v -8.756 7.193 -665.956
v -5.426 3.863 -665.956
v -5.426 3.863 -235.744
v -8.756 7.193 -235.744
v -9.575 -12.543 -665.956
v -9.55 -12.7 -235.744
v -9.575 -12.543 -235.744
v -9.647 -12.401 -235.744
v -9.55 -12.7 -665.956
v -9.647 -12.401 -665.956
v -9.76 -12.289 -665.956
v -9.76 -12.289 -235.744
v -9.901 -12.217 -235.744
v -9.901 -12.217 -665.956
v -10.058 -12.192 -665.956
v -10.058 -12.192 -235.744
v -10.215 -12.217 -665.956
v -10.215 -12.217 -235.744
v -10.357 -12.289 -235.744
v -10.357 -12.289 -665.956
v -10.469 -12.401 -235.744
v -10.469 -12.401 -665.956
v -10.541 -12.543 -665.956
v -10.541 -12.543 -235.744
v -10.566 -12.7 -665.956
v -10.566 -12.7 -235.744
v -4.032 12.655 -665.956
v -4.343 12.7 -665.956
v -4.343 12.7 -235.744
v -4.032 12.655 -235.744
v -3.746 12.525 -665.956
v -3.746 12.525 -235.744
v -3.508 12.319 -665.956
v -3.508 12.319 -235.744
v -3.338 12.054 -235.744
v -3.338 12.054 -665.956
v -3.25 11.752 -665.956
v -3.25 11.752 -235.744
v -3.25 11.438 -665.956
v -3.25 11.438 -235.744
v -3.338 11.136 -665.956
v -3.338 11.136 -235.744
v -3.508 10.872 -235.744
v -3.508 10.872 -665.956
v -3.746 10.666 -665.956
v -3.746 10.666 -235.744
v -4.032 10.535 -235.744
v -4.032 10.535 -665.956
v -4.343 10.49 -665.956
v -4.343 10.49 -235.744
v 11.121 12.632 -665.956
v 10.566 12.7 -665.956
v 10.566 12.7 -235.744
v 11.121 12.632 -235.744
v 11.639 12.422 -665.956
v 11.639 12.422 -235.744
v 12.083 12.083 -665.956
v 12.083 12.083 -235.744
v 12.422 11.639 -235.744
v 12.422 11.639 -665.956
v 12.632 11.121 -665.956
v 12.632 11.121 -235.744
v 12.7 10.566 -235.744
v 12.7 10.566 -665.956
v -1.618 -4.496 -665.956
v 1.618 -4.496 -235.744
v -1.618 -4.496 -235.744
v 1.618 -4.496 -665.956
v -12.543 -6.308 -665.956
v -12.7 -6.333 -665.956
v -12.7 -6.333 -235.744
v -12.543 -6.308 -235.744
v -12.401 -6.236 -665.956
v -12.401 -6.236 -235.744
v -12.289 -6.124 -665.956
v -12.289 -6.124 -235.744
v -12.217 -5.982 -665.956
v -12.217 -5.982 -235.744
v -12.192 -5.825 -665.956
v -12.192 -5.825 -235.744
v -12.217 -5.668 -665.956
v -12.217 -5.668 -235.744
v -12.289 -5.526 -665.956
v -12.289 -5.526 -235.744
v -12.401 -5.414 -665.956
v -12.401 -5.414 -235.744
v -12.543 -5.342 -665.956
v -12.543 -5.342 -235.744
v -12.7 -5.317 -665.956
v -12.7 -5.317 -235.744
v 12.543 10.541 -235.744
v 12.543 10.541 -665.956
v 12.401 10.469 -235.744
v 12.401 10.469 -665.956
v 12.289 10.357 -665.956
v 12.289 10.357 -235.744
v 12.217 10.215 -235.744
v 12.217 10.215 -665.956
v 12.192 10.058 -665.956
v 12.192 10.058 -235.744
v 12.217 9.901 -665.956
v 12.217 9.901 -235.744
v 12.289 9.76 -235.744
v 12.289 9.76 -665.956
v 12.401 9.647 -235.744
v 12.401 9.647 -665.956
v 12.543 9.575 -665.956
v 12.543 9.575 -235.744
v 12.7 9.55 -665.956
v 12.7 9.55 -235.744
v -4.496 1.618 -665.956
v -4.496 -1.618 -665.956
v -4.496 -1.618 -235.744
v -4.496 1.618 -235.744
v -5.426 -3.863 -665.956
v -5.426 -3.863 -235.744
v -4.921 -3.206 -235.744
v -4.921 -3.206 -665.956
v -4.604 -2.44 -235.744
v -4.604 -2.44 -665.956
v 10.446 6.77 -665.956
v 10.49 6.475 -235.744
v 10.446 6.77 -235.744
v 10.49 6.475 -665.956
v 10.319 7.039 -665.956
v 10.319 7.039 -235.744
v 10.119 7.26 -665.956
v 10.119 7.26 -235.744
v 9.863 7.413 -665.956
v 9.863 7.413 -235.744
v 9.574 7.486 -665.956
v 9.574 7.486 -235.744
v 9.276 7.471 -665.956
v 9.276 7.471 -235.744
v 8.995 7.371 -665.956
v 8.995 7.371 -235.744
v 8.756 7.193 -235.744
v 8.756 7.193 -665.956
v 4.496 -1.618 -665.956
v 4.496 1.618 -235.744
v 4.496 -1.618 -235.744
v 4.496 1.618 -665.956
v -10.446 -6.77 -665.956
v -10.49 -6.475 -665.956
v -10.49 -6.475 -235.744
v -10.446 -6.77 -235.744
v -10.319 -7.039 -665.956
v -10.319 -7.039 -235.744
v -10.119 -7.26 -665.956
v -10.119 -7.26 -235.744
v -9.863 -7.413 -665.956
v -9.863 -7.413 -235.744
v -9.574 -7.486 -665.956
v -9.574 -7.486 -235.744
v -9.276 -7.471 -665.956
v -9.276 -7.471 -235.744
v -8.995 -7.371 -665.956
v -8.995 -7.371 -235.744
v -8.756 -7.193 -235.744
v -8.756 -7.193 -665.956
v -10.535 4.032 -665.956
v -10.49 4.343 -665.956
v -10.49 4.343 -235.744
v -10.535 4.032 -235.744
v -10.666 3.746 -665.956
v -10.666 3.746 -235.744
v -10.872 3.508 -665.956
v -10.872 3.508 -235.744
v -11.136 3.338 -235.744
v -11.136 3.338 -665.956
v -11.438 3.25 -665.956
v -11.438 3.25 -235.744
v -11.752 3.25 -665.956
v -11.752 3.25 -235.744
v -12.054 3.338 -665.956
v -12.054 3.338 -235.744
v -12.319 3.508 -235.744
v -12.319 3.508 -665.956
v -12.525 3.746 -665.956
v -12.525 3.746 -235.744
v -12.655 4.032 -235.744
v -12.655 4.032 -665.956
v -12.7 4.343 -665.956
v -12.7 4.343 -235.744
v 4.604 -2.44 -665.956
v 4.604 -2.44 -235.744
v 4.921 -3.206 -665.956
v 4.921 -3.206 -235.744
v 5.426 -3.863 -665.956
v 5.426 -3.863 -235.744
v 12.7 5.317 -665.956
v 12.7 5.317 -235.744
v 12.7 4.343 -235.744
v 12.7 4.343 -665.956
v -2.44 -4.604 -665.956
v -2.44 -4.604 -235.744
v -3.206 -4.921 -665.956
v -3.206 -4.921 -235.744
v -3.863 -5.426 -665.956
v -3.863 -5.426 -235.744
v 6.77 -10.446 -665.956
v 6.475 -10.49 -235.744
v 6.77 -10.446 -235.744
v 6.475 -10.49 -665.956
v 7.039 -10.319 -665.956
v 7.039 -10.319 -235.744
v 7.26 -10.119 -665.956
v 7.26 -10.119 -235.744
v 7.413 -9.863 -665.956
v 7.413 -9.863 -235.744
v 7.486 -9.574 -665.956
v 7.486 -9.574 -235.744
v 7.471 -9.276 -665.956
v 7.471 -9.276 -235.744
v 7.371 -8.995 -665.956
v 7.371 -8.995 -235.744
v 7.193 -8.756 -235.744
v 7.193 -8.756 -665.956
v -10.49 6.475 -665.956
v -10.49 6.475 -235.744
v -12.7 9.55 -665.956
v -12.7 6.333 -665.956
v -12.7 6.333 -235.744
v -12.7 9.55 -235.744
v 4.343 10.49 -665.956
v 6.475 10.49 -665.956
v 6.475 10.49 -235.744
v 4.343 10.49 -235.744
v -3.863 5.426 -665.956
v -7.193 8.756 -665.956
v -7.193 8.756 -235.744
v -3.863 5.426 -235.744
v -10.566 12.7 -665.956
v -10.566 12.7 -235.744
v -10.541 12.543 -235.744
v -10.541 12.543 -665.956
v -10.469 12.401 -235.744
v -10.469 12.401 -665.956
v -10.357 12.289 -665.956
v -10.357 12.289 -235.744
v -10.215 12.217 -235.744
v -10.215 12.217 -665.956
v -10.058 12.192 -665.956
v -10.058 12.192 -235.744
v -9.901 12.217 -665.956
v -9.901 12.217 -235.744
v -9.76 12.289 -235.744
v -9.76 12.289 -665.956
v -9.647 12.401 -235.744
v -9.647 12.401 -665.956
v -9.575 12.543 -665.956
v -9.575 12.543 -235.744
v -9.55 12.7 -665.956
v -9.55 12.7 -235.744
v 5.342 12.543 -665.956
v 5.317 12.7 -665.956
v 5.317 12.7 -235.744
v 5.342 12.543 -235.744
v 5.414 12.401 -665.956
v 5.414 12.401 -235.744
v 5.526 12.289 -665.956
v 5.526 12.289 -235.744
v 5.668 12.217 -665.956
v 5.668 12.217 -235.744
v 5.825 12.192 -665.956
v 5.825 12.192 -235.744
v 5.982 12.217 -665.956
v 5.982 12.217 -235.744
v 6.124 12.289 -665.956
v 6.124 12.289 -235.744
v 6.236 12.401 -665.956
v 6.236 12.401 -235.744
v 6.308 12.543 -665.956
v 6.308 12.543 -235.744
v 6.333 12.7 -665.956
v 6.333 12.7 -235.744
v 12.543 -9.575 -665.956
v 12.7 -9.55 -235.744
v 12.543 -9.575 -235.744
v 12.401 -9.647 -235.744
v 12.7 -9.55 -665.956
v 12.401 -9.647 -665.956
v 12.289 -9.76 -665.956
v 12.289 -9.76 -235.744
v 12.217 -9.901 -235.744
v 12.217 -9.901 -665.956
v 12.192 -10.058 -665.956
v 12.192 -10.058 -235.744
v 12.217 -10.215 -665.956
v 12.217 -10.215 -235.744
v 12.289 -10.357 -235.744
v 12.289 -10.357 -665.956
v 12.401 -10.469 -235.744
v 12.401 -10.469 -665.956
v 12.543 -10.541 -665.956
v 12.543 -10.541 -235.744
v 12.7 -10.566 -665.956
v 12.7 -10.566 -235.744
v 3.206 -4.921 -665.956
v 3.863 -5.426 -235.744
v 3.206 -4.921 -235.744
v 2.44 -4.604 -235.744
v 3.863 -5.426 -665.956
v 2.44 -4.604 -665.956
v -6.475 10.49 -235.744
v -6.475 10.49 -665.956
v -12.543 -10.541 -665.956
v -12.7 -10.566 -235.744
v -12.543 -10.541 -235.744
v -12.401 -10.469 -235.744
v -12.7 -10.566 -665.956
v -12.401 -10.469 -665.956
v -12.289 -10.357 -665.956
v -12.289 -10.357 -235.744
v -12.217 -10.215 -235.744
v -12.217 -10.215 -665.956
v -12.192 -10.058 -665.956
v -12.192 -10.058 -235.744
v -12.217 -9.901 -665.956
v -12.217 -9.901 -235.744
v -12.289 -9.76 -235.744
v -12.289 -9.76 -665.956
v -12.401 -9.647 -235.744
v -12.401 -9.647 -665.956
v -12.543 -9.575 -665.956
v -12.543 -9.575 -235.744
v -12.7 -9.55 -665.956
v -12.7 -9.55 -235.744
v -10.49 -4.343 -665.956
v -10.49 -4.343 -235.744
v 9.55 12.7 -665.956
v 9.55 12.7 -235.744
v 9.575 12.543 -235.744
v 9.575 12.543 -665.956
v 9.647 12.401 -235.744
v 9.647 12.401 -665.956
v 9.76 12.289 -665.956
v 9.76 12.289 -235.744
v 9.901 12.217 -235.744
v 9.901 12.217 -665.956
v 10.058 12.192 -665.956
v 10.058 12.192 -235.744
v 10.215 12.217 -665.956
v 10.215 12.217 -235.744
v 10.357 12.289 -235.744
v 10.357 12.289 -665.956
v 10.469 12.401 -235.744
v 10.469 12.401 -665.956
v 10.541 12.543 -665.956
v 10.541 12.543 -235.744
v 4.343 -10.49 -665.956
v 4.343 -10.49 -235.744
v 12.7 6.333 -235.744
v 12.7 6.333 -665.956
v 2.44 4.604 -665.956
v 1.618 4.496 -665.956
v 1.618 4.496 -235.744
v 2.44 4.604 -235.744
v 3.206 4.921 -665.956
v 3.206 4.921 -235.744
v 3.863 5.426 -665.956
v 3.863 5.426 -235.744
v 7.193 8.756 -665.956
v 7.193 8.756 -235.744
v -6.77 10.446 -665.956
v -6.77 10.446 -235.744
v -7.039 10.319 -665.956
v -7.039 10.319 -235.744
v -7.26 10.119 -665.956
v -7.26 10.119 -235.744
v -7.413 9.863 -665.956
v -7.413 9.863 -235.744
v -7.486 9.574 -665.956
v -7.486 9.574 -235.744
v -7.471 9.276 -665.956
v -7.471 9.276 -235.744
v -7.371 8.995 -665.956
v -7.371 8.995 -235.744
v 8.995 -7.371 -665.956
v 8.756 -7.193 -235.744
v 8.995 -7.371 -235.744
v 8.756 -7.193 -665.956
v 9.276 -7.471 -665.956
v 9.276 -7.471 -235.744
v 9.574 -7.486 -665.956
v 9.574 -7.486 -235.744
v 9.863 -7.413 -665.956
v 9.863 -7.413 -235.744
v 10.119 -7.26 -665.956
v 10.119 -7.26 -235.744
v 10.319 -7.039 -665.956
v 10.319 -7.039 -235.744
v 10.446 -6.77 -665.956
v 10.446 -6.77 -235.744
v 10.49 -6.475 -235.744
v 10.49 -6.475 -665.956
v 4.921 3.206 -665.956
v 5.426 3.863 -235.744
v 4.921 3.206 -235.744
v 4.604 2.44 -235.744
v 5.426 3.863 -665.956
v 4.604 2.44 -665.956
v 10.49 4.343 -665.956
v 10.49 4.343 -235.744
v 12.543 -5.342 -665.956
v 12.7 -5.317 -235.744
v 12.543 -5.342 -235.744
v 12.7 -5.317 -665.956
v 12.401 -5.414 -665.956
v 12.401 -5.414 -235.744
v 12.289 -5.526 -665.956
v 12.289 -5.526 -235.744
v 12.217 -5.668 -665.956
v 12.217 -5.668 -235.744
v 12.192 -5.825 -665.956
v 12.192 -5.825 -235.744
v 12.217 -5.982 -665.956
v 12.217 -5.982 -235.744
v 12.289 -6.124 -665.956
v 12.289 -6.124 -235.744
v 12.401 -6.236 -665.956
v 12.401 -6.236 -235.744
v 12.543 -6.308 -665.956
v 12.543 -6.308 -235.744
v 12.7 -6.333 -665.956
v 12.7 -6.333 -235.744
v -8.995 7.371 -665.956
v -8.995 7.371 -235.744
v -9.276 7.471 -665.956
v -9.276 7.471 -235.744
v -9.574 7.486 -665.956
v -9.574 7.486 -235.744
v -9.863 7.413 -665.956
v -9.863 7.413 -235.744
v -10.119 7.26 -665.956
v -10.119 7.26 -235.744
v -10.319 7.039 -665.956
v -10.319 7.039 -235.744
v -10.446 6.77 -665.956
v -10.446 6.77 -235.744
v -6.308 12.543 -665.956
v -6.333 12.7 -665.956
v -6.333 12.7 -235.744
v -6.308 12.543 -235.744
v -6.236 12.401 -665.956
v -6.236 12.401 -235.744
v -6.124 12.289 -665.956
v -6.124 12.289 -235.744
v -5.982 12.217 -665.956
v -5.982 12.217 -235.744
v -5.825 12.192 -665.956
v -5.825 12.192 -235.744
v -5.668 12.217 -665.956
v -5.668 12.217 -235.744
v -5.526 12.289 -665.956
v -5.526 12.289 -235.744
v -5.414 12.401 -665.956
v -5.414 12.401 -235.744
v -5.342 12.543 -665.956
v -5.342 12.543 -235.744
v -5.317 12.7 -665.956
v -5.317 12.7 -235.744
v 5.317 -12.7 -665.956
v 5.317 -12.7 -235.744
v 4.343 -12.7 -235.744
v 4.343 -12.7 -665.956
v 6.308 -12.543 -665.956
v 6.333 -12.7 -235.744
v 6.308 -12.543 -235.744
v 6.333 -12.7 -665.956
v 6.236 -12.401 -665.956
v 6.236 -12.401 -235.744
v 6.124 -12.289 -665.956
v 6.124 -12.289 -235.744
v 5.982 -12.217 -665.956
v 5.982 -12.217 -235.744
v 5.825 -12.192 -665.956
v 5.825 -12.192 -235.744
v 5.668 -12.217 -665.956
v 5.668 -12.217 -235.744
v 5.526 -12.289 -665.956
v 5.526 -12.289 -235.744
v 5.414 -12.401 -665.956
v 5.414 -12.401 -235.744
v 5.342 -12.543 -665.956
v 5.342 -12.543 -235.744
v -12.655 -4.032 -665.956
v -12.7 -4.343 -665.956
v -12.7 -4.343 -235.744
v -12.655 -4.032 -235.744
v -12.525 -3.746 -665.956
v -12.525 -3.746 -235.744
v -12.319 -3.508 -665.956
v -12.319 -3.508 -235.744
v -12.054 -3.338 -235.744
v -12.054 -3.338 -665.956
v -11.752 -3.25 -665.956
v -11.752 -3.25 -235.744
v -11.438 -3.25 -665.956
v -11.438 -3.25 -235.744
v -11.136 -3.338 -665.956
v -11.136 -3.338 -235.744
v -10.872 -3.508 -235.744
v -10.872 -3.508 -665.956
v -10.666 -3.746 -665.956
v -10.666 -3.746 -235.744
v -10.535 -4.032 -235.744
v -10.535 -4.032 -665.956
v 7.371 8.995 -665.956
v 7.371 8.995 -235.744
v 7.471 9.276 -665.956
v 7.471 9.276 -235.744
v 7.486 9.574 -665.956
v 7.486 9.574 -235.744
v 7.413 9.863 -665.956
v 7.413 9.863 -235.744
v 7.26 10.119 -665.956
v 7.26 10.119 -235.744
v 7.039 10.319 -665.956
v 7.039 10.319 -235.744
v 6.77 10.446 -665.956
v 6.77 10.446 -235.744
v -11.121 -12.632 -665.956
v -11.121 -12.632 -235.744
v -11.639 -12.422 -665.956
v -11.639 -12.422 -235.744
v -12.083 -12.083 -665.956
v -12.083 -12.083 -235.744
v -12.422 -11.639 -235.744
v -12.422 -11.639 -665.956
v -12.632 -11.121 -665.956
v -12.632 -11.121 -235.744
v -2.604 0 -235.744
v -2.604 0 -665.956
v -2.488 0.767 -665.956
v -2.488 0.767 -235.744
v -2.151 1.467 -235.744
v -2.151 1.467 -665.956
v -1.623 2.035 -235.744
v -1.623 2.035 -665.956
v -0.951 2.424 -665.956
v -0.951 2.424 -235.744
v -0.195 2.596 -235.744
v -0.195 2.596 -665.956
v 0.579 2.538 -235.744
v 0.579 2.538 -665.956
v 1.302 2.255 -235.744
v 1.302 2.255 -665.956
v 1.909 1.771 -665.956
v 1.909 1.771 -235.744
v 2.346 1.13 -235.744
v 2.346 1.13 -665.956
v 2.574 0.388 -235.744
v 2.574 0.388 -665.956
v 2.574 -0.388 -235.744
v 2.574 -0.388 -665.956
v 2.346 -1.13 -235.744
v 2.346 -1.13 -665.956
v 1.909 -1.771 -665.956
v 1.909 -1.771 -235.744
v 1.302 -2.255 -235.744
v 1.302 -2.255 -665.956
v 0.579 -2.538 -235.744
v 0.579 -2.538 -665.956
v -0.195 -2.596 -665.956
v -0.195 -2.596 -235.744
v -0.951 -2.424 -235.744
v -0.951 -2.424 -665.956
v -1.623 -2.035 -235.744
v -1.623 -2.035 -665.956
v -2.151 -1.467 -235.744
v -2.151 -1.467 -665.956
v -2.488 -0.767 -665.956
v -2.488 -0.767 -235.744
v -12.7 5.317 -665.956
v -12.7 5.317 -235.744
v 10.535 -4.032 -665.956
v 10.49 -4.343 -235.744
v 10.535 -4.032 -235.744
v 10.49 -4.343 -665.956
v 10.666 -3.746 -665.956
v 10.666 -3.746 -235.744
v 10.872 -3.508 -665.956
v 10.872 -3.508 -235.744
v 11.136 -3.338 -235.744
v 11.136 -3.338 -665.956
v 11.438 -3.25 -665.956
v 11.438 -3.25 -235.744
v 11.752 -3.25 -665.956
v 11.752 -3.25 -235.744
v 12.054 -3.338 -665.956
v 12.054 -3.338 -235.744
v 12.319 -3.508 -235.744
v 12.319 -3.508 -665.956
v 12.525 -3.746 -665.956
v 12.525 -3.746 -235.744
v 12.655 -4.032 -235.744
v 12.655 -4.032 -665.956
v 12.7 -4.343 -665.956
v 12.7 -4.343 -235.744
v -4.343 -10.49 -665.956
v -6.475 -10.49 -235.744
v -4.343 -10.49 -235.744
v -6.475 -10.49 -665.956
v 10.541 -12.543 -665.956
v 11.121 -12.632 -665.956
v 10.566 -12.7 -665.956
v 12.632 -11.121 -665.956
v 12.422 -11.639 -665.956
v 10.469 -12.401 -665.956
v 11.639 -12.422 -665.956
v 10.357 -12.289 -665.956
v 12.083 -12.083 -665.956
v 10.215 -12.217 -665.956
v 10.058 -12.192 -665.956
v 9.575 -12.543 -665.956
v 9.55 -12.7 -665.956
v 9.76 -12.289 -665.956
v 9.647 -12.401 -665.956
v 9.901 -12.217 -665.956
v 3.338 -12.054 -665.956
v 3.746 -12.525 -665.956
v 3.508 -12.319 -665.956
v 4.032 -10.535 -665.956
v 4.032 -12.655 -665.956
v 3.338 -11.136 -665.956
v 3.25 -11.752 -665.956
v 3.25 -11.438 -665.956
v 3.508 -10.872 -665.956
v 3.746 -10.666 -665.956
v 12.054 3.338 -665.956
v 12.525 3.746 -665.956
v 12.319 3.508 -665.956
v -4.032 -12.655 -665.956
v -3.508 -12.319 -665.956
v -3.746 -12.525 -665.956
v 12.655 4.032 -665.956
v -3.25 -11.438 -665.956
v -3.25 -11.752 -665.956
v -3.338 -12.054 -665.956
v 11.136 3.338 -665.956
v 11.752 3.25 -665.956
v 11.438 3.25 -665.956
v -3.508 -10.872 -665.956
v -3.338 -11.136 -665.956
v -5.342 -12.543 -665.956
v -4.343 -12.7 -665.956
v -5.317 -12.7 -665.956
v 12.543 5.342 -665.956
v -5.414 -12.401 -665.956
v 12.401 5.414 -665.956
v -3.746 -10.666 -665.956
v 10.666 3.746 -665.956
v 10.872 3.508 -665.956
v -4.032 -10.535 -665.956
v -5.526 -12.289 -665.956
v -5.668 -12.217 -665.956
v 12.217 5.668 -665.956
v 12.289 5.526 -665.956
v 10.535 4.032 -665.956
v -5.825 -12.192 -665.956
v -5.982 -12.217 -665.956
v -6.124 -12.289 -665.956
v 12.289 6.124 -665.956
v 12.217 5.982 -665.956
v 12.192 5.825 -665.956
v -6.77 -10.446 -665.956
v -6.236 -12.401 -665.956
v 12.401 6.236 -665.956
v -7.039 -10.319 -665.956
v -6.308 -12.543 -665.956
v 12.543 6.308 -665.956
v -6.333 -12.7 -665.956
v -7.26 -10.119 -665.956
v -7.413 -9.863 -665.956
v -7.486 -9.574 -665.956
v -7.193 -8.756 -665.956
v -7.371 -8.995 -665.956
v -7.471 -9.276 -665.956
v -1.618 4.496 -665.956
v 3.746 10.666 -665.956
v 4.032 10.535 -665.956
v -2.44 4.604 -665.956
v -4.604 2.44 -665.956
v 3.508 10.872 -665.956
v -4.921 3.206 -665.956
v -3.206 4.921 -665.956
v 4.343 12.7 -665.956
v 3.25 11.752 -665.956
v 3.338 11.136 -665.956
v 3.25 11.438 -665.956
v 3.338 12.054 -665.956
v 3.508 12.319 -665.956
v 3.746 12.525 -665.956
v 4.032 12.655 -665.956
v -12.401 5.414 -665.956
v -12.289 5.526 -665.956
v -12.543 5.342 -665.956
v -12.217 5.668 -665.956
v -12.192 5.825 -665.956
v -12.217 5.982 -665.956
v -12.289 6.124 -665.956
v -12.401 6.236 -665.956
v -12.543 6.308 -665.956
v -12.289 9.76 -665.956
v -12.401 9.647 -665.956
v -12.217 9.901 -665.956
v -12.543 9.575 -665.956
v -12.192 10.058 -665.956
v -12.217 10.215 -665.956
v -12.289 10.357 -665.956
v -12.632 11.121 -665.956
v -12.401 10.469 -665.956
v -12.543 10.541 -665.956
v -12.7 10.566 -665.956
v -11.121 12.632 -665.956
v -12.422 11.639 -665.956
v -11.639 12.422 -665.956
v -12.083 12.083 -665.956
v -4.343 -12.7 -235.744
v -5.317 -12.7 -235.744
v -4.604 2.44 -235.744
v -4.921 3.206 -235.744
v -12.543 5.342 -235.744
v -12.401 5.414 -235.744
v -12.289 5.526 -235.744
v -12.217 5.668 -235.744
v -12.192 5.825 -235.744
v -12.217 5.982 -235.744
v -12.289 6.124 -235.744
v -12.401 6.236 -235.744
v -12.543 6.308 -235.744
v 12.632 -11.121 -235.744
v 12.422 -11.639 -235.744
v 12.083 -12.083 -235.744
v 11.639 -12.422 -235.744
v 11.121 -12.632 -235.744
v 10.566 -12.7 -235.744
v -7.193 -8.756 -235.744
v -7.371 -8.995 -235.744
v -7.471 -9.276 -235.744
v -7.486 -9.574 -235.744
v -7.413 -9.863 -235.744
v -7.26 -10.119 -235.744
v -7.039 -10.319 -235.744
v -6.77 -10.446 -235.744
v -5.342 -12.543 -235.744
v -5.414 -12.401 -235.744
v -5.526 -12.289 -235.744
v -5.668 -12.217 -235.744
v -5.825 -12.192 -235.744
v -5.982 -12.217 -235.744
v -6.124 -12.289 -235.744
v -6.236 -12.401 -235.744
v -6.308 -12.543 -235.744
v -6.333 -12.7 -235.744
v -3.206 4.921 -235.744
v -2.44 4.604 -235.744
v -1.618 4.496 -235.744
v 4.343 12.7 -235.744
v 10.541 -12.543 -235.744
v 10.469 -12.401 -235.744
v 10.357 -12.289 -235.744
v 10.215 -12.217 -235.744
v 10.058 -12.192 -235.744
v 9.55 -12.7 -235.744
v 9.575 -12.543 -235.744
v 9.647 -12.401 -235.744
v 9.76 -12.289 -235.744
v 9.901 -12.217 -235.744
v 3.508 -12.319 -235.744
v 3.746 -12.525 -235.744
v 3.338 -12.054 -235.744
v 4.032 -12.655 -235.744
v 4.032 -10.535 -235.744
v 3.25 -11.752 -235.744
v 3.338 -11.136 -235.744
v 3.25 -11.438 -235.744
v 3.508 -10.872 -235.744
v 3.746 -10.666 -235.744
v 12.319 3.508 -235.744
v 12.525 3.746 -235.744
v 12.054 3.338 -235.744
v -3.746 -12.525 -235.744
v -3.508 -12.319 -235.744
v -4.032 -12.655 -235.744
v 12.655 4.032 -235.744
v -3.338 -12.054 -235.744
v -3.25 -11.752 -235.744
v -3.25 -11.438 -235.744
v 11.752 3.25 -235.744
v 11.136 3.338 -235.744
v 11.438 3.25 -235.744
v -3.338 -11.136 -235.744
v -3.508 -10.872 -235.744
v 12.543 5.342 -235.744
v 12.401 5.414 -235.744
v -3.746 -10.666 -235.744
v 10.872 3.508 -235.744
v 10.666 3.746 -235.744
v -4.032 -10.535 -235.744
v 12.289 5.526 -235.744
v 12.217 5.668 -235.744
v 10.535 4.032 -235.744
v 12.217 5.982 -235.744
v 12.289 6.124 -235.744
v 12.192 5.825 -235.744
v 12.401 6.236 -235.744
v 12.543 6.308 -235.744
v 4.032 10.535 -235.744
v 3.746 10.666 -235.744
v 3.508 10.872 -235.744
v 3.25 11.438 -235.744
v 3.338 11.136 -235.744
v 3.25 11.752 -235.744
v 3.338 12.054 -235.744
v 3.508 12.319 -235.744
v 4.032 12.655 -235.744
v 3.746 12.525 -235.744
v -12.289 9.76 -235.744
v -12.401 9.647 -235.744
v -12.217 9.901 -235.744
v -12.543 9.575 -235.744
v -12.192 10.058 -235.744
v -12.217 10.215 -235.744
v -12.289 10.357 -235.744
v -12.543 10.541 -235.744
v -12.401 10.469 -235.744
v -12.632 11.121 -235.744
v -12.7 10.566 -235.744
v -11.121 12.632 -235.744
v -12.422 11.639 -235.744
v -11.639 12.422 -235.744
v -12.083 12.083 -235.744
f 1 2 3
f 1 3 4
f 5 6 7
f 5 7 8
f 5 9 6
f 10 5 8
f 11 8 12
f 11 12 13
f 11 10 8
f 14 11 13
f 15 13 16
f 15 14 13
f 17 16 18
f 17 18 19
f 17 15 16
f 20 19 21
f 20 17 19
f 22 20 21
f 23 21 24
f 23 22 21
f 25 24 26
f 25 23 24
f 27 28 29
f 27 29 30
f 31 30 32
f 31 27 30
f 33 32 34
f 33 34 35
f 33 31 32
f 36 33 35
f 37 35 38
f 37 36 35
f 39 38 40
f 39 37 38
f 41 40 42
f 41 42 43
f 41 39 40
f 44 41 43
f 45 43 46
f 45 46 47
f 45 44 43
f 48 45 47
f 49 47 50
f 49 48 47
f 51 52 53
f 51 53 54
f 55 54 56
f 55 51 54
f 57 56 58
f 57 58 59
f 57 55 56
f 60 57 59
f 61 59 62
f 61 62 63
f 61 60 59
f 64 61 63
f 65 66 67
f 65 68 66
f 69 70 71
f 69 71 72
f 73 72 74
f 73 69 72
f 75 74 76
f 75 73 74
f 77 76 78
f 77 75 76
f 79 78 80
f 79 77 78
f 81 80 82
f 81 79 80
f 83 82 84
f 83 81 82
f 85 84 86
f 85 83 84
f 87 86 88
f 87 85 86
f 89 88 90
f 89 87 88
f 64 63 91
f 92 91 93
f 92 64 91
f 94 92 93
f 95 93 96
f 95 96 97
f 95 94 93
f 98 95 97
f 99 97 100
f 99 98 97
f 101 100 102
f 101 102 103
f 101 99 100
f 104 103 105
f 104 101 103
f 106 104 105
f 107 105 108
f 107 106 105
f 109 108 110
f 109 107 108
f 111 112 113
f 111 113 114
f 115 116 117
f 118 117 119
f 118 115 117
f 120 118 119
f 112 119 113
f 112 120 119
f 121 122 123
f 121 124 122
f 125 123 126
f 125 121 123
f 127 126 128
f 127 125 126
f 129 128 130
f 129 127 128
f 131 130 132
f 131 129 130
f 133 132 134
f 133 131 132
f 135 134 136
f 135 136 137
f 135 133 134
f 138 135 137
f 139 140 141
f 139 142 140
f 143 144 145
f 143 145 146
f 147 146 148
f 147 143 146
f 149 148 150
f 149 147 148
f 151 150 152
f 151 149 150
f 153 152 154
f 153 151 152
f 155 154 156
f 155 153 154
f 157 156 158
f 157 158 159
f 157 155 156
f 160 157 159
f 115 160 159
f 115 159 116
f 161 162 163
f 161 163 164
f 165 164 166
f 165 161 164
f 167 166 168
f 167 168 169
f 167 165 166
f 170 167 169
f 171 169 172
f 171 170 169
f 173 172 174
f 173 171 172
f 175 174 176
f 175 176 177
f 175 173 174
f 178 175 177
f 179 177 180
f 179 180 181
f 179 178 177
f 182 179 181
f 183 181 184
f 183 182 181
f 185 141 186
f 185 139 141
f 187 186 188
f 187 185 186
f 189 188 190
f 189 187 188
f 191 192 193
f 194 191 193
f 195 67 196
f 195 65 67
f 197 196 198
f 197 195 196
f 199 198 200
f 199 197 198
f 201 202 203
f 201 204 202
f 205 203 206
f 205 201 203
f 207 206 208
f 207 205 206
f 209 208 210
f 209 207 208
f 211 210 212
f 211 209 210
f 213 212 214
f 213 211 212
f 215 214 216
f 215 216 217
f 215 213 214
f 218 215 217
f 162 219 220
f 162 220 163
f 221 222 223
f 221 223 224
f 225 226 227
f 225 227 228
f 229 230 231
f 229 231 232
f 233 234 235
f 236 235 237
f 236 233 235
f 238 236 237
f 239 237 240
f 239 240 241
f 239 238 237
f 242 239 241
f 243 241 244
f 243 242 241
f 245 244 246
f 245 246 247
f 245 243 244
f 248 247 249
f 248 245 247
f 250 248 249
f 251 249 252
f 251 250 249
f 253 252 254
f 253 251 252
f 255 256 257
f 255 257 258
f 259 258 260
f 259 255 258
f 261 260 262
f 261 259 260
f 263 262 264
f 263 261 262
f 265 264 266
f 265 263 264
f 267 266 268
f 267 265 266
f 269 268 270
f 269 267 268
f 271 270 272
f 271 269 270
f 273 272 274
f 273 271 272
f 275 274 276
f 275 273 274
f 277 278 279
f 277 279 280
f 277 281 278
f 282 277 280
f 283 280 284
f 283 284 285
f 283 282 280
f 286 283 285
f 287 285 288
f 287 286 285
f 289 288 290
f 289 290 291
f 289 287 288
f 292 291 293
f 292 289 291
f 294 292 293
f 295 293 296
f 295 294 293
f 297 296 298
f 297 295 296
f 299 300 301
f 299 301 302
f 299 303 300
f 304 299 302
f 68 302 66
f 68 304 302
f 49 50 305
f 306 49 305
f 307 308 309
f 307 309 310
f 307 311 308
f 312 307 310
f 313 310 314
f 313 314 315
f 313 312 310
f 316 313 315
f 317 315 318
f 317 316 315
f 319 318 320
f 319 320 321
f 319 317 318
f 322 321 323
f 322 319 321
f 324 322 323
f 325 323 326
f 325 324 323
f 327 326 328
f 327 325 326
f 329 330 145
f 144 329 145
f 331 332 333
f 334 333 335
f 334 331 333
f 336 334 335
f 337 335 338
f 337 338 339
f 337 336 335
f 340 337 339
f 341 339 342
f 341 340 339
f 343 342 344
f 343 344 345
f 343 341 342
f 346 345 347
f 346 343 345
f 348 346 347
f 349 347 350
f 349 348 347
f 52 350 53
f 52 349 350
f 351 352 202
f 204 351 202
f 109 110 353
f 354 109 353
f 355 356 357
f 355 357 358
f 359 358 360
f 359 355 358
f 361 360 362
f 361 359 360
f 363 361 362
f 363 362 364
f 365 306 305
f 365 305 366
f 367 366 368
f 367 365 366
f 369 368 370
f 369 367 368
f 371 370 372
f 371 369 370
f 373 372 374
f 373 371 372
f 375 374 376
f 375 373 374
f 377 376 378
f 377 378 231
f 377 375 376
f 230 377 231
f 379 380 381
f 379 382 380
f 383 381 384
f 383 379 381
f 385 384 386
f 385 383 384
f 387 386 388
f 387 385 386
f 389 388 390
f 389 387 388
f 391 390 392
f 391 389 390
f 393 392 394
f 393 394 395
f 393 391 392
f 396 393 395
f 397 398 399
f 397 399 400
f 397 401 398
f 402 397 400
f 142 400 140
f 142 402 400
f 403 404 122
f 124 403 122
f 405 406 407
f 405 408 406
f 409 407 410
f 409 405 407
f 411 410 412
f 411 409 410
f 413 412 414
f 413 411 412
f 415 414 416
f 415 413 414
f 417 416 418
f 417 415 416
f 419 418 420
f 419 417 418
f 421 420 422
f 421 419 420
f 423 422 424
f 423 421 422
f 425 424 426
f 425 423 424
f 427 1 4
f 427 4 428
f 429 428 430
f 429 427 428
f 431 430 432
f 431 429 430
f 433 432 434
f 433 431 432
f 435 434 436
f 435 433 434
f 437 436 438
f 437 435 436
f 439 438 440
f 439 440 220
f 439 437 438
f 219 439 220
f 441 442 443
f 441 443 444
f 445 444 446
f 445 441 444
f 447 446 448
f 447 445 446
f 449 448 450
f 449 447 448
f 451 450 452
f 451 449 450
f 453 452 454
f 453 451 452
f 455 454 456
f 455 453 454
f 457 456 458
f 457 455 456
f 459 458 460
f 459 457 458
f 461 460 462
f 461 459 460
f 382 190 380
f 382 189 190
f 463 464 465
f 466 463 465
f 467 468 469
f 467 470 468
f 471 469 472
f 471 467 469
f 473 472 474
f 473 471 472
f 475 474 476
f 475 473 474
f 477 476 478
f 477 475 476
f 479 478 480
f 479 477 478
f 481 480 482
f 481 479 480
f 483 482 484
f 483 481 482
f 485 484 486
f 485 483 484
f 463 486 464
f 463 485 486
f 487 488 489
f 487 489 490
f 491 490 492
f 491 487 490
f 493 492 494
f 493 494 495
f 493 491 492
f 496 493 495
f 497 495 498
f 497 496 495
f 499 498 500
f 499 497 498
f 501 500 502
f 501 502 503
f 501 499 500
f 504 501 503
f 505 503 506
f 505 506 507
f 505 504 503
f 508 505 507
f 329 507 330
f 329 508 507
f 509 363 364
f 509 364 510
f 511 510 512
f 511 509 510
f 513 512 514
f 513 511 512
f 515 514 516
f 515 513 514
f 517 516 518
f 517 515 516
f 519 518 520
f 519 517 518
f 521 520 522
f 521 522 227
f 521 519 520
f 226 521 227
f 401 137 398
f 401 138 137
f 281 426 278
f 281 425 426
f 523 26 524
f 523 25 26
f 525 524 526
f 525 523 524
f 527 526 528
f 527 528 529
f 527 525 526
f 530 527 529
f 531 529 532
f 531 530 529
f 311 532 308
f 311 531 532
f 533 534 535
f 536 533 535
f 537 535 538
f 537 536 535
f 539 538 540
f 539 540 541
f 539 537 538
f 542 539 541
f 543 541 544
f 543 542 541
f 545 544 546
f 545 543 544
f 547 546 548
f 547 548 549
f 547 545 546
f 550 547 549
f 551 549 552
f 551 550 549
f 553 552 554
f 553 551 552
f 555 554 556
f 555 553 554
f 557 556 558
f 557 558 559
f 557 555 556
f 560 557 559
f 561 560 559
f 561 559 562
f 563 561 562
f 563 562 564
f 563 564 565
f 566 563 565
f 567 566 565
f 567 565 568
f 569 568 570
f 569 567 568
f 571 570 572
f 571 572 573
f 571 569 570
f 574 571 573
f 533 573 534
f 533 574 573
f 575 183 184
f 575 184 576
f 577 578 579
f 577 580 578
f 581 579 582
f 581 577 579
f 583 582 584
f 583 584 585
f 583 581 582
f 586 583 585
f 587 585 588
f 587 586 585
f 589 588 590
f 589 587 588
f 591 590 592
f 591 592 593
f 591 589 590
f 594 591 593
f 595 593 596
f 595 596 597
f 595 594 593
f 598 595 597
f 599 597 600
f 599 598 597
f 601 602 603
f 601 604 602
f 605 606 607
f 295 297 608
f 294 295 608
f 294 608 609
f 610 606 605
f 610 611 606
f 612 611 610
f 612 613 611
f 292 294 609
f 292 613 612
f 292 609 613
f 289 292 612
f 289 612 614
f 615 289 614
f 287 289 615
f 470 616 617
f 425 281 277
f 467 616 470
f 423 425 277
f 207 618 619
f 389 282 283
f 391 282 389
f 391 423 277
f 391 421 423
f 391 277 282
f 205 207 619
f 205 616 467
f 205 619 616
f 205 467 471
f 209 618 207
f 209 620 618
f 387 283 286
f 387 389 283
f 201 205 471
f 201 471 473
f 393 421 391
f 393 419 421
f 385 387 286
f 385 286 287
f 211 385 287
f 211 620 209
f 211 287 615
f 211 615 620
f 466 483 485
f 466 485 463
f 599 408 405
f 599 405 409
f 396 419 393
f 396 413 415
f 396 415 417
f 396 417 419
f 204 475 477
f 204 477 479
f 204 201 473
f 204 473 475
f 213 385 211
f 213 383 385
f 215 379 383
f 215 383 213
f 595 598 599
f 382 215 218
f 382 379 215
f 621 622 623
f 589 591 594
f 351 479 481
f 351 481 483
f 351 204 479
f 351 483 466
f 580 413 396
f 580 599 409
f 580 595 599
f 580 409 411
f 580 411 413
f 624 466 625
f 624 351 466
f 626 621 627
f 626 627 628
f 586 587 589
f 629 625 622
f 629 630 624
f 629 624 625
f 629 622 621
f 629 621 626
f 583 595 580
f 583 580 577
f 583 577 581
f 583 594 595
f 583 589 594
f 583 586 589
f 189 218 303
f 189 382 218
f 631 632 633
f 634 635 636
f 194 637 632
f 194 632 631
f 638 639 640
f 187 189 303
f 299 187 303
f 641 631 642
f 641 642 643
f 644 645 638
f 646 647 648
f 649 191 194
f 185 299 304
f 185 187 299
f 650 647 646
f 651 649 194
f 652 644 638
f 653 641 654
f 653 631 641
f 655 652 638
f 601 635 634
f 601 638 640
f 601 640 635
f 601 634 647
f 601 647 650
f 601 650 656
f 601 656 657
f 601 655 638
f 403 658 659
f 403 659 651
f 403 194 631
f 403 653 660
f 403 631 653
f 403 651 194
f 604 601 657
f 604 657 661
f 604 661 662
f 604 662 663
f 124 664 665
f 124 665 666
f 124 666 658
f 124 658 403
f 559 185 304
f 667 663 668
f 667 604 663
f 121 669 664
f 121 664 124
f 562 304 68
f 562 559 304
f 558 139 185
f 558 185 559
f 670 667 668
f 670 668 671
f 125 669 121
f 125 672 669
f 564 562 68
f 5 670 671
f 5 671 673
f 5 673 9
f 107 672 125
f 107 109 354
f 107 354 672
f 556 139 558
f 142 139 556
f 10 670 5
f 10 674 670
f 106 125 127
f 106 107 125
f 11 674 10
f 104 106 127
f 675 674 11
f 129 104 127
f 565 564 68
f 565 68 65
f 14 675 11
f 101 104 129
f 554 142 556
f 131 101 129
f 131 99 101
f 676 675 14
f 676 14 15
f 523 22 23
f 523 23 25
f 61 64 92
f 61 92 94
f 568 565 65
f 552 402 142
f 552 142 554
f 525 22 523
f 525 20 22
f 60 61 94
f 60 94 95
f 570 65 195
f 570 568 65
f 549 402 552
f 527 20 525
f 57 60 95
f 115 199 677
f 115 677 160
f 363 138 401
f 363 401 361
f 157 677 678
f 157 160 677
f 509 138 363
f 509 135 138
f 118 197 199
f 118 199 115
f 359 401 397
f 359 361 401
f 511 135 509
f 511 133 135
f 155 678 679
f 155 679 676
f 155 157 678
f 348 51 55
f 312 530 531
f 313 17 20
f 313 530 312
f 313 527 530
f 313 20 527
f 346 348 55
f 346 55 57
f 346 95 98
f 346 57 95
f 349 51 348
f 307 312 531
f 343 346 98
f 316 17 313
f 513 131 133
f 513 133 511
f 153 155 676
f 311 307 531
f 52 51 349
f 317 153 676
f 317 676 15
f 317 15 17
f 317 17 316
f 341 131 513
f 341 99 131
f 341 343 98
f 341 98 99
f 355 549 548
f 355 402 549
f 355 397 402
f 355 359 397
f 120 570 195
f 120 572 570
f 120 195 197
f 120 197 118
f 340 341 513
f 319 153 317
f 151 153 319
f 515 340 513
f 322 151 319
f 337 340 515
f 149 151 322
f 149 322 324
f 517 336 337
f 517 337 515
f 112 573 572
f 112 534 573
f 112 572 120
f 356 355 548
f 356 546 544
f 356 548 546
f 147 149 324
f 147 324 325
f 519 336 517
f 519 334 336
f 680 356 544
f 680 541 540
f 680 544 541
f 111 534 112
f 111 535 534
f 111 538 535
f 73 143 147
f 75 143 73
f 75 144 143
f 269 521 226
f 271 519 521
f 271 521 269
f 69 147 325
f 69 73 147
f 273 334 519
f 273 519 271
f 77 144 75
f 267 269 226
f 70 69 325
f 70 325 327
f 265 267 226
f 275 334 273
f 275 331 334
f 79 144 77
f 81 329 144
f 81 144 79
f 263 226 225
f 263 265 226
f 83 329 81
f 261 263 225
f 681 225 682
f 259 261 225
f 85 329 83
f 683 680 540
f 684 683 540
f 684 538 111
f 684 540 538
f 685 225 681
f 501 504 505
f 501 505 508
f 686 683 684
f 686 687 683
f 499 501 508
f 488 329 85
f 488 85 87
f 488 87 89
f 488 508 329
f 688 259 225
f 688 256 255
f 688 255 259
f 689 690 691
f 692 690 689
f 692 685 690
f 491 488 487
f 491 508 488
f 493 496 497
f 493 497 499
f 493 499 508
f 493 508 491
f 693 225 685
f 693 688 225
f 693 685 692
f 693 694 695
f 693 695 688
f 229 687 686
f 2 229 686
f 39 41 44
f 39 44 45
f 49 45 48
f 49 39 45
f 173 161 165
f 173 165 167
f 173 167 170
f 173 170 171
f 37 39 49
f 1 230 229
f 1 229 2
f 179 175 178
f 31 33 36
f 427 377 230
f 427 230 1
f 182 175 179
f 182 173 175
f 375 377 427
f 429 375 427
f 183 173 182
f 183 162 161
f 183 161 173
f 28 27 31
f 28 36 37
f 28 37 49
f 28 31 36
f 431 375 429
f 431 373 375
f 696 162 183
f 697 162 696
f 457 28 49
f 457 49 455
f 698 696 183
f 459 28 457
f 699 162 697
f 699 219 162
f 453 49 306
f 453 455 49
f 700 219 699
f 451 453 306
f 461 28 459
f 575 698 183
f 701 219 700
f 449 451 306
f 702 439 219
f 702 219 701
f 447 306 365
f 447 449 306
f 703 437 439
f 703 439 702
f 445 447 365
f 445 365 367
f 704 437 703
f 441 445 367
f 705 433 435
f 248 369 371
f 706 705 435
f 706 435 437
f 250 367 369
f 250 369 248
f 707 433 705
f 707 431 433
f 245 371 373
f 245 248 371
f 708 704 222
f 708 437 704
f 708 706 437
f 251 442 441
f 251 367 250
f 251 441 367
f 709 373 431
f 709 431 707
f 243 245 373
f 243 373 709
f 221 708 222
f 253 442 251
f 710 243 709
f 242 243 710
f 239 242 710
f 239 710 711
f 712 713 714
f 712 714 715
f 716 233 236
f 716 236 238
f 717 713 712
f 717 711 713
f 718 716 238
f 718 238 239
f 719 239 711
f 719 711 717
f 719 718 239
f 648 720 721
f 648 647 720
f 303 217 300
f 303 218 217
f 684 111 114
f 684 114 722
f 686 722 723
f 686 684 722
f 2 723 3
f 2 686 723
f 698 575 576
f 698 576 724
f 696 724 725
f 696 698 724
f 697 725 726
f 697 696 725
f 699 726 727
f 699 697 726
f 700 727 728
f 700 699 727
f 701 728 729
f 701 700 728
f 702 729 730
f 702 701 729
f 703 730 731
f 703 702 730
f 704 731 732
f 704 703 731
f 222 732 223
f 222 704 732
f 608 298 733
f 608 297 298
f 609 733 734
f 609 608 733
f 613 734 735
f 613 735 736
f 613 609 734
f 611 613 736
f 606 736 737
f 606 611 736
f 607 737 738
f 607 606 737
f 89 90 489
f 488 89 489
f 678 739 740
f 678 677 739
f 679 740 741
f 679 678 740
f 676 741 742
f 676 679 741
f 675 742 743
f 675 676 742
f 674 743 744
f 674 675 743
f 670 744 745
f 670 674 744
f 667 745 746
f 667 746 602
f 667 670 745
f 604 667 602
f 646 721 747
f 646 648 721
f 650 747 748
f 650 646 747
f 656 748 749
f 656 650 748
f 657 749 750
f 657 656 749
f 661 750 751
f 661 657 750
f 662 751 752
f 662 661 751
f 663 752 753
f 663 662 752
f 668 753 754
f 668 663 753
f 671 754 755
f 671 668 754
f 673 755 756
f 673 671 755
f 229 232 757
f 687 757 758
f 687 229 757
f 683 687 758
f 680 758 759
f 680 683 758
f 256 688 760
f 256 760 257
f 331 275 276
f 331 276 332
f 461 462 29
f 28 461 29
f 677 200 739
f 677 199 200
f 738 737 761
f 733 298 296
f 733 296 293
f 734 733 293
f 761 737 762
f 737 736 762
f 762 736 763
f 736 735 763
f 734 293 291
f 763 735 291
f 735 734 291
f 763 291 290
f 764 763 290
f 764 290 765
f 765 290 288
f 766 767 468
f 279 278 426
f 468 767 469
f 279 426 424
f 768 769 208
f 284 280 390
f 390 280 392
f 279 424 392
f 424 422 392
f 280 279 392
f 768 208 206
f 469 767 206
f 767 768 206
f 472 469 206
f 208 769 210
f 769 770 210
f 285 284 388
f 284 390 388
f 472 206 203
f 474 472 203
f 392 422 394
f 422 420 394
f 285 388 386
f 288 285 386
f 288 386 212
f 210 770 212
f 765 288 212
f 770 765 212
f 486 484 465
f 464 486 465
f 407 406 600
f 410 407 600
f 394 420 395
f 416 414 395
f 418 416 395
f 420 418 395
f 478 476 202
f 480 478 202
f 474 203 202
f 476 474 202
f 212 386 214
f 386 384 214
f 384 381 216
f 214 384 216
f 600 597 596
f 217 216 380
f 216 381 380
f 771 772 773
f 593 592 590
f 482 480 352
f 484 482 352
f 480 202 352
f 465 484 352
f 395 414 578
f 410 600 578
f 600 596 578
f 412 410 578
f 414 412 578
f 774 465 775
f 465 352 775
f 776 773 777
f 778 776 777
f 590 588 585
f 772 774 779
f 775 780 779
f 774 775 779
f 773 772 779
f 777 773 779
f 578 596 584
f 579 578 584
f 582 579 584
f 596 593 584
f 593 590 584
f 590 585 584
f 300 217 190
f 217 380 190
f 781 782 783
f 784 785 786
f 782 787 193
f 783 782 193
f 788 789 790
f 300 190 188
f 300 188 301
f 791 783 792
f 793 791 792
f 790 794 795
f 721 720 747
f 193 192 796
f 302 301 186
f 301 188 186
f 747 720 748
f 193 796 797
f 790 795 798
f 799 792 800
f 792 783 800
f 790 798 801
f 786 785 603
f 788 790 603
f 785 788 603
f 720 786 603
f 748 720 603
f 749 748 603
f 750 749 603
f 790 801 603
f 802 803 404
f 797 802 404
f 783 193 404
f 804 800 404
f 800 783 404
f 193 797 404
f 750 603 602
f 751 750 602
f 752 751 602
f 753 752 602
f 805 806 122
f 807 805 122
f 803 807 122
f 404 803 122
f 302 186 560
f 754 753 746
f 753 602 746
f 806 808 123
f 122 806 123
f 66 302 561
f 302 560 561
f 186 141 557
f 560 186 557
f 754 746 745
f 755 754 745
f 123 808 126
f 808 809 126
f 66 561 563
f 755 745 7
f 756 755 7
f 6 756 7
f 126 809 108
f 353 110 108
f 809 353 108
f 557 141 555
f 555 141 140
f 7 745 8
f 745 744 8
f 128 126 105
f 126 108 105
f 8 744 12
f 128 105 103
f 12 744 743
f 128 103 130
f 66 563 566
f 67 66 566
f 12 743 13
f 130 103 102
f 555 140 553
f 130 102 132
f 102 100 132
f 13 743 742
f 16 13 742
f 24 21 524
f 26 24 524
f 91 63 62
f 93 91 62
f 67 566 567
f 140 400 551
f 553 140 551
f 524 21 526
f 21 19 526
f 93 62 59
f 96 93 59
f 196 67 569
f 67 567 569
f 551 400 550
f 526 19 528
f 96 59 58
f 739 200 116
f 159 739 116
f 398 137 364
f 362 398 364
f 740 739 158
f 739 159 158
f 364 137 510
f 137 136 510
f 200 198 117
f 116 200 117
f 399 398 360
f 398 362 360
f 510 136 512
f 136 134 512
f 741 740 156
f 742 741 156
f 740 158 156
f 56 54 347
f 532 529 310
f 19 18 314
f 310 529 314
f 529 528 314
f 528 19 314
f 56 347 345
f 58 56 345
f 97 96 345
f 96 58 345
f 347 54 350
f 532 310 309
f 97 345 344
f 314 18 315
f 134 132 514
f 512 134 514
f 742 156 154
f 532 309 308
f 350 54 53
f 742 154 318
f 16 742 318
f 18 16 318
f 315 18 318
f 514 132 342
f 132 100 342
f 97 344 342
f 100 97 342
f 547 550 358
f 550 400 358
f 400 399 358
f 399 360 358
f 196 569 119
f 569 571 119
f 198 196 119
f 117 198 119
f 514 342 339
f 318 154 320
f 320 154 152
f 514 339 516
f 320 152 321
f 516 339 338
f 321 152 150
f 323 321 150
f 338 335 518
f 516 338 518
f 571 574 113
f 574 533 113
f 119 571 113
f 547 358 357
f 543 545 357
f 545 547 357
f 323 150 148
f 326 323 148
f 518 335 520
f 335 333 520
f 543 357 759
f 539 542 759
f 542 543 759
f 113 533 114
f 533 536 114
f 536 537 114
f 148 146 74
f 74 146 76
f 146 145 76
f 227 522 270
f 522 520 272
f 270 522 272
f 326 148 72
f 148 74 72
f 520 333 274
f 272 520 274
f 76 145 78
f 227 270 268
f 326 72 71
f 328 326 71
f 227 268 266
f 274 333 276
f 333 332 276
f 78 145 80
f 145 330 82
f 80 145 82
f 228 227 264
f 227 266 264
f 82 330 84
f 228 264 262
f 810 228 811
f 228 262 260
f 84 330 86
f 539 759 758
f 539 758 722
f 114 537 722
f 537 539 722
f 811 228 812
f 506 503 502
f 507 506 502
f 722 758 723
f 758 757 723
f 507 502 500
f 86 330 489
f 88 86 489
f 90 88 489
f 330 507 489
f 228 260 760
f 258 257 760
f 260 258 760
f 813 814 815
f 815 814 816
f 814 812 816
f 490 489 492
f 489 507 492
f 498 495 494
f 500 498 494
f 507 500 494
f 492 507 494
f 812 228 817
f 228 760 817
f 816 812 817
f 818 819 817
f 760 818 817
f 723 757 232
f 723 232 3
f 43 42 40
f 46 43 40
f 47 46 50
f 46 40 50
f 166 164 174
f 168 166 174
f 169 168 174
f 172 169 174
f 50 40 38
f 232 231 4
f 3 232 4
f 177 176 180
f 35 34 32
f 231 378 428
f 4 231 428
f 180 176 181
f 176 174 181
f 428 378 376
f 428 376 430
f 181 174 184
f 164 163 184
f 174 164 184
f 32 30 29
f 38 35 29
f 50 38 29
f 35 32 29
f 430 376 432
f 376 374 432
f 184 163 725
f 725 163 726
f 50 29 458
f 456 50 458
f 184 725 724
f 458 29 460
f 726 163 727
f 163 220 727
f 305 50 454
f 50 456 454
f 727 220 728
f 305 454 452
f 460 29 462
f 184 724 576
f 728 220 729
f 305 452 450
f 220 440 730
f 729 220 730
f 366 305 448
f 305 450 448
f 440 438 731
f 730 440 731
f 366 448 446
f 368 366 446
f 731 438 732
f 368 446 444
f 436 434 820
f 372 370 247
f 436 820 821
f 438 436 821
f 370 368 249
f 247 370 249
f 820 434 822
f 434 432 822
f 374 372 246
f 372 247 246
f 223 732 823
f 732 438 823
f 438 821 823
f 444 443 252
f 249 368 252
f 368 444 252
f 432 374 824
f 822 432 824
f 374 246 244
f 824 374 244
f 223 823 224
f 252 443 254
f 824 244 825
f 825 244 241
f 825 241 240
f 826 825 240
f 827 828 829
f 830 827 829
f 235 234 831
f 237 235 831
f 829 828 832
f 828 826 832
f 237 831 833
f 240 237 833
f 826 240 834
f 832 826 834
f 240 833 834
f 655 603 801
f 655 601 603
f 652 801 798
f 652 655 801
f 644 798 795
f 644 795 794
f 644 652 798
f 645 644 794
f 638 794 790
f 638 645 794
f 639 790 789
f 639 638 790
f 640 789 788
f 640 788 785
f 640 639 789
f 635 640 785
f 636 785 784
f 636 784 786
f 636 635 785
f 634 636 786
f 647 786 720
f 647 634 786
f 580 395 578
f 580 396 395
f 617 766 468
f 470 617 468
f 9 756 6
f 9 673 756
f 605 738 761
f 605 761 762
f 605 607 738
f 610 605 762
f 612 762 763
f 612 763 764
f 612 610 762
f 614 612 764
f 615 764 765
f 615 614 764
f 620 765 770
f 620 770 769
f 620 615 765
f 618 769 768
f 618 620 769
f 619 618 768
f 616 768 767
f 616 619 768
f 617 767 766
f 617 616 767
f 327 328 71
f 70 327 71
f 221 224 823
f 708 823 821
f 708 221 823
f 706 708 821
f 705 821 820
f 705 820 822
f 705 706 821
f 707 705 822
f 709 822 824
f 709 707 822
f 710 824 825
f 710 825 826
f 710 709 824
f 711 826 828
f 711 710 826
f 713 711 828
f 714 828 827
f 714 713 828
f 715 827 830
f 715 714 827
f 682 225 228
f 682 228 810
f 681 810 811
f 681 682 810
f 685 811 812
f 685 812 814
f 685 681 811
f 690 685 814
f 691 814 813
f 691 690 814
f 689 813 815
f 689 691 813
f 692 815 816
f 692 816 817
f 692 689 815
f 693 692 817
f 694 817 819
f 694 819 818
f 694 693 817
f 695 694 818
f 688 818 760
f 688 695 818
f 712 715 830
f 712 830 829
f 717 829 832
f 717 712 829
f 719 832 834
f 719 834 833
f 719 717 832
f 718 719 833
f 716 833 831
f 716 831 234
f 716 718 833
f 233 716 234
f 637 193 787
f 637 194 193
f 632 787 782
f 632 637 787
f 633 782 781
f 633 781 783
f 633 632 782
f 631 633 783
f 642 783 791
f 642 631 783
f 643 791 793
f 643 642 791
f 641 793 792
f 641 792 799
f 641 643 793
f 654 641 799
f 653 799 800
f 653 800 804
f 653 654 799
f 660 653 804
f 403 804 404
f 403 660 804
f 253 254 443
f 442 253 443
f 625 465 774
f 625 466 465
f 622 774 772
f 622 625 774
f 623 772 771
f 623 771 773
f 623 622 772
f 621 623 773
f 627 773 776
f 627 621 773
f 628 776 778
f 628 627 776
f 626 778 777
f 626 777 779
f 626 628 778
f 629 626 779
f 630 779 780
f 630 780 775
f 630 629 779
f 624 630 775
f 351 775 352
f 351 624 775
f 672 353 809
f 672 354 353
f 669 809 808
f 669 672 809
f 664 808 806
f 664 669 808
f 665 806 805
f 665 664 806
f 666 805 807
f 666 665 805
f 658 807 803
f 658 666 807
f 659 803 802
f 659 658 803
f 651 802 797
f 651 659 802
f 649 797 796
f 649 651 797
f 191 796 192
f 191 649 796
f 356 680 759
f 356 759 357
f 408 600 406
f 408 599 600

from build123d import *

# Parameters (mm, degrees)
SKETCH1_R           = 2.6035
BOSS_EXTRUDE1_DEPTH = 215.10625


with BuildPart() as part:
    # Sketch1 → Boss-Extrude1 (new body, symmetric)
    with BuildSketch(Plane(origin=(0, 0, -450.85), x_dir=(-1, 0, 0), z_dir=(0, 0, -1))):
        with BuildLine():
            Line((12.7, -9.5504), (12.7, -6.3330836))
            ThreePointArc((12.7, -6.3330836), (12.192, -5.8250836), (12.7, -5.3170836))
            Line((12.7, -5.3170836), (12.7, -4.3434))
            ThreePointArc((12.7, -4.3434), (11.5951, -3.2385), (10.4902, -4.3434))
            Line((10.4902, -4.3434), (10.4902, -6.474794456))
            ThreePointArc((10.4902, -6.474794456), (9.863006367, -7.413456061), (8.75577951, -7.193214945))
            Line((8.75577951, -7.193214945), (5.42573597, -3.863171405))
            ThreePointArc((5.42573597, -3.863171405), (4.737482484, -2.833127272), (4.4958, -1.618107374))
            Line((4.4958, -1.618107374), (4.4958, 1.618107374))
            ThreePointArc((4.4958, 1.618107374), (4.737482484, 2.833127272), (5.42573597, 3.863171405))
            Line((5.42573597, 3.863171405), (8.75577951, 7.193214945))
            ThreePointArc((8.75577951, 7.193214945), (9.863006367, 7.413456061), (10.4902, 6.474794456))
            Line((10.4902, 6.474794456), (10.4902, 4.343399971))
            ThreePointArc((10.4902, 4.343399971), (11.5951, 3.238499971), (12.7, 4.343399971))
            Line((12.7, 4.343399971), (12.7, 5.3170836))
            ThreePointArc((12.7, 5.3170836), (12.192, 5.8250836), (12.7, 6.3330836))
            Line((12.7, 6.3330836), (12.7, 9.5504))
            ThreePointArc((12.7, 9.5504), (12.192000006, 10.058323491), (12.699846982, 10.566399977))
            ThreePointArc((12.699846982, 10.566399977), (12.082522516, 12.082522516), (10.566399977, 12.699846982))
            ThreePointArc((10.566399977, 12.699846982), (10.058323491, 12.192000006), (9.5504, 12.7))
            Line((9.5504, 12.7), (6.3330836, 12.7))
            ThreePointArc((6.3330836, 12.7), (5.8250836, 12.192), (5.3170836, 12.7))
            Line((5.3170836, 12.7), (4.3434, 12.7))
            ThreePointArc((4.3434, 12.7), (3.2385, 11.5951), (4.3434, 10.4902))
            Line((4.3434, 10.4902), (6.474794456, 10.4902))
            ThreePointArc((6.474794456, 10.4902), (7.413456061, 9.863006367), (7.193214945, 8.75577951))
            Line((7.193214945, 8.75577951), (3.863171405, 5.42573597))
            ThreePointArc((3.863171405, 5.42573597), (2.833127272, 4.737482484), (1.618107374, 4.4958))
            Line((1.618107374, 4.4958), (-1.618107374, 4.4958))
            ThreePointArc((-1.618107374, 4.4958), (-2.833127272, 4.737482484), (-3.863171405, 5.42573597))
            Line((-3.863171405, 5.42573597), (-7.193214945, 8.75577951))
            ThreePointArc((-7.193214945, 8.75577951), (-7.413456061, 9.863006367), (-6.474794456, 10.4902))
            Line((-6.474794456, 10.4902), (-4.343399971, 10.4902))
            ThreePointArc((-4.343399971, 10.4902), (-3.238499971, 11.5951), (-4.343399971, 12.7))
            Line((-4.343399971, 12.7), (-5.3170836, 12.7))
            ThreePointArc((-5.3170836, 12.7), (-5.8250836, 12.192), (-6.3330836, 12.7))
            Line((-6.3330836, 12.7), (-9.5504, 12.7))
            ThreePointArc((-9.5504, 12.7), (-10.058323491, 12.192000006), (-10.566399977, 12.699846982))
            ThreePointArc((-10.566399977, 12.699846982), (-12.082522516, 12.082522516), (-12.699846982, 10.566399977))
            ThreePointArc((-12.699846982, 10.566399977), (-12.192000006, 10.058323491), (-12.7, 9.5504))
            Line((-12.7, 9.5504), (-12.7, 6.3330836))
            ThreePointArc((-12.7, 6.3330836), (-12.192, 5.8250836), (-12.7, 5.3170836))
            Line((-12.7, 5.3170836), (-12.7, 4.3434))
            ThreePointArc((-12.7, 4.3434), (-11.5951, 3.2385), (-10.4902, 4.3434))
            Line((-10.4902, 4.3434), (-10.4902, 6.474794456))
            ThreePointArc((-10.4902, 6.474794456), (-9.863006367, 7.413456061), (-8.75577951, 7.193214945))
            Line((-8.75577951, 7.193214945), (-5.42573597, 3.863171405))
            ThreePointArc((-5.42573597, 3.863171405), (-4.737482484, 2.833127272), (-4.4958, 1.618107374))
            Line((-4.4958, 1.618107374), (-4.4958, -1.618107374))
            ThreePointArc((-4.4958, -1.618107374), (-4.737482484, -2.833127272), (-5.42573597, -3.863171405))
            Line((-5.42573597, -3.863171405), (-8.75577951, -7.193214945))
            ThreePointArc((-8.75577951, -7.193214945), (-9.863006367, -7.413456061), (-10.4902, -6.474794456))
            Line((-10.4902, -6.474794456), (-10.4902, -4.343399971))
            ThreePointArc((-10.4902, -4.343399971), (-11.5951, -3.238499971), (-12.7, -4.343399971))
            Line((-12.7, -4.343399971), (-12.7, -5.3170836))
            ThreePointArc((-12.7, -5.3170836), (-12.192, -5.8250836), (-12.7, -6.3330836))
            Line((-12.7, -6.3330836), (-12.7, -9.5504))
            ThreePointArc((-12.7, -9.5504), (-12.192000006, -10.058323491), (-12.699846982, -10.566399977))
            ThreePointArc((-12.699846982, -10.566399977), (-12.082522516, -12.082522516), (-10.566399977, -12.699846982))
            ThreePointArc((-10.566399977, -12.699846982), (-10.058323491, -12.192000006), (-9.5504, -12.7))
            Line((-9.5504, -12.7), (-6.3330836, -12.7))
            ThreePointArc((-6.3330836, -12.7), (-5.8250836, -12.192), (-5.3170836, -12.7))
            Line((-5.3170836, -12.7), (-4.3434, -12.7))
            ThreePointArc((-4.3434, -12.7), (-3.2385, -11.5951), (-4.3434, -10.4902))
            Line((-4.3434, -10.4902), (-6.474794456, -10.4902))
            ThreePointArc((-6.474794456, -10.4902), (-7.413456061, -9.863006367), (-7.193214945, -8.75577951))
            Line((-7.193214945, -8.75577951), (-3.863171405, -5.42573597))
            ThreePointArc((-3.863171405, -5.42573597), (-2.833127272, -4.737482484), (-1.618107374, -4.4958))
            Line((-1.618107374, -4.4958), (1.618107374, -4.4958))
            ThreePointArc((1.618107374, -4.4958), (2.833127272, -4.737482484), (3.863171405, -5.42573597))
            Line((3.863171405, -5.42573597), (7.193214945, -8.75577951))
            ThreePointArc((7.193214945, -8.75577951), (7.413456061, -9.863006367), (6.474794456, -10.4902))
            Line((6.474794456, -10.4902), (4.343399971, -10.4902))
            ThreePointArc((4.343399971, -10.4902), (3.238499971, -11.5951), (4.343399971, -12.7))
            Line((4.343399971, -12.7), (5.3170836, -12.7))
            ThreePointArc((5.3170836, -12.7), (5.8250836, -12.192), (6.3330836, -12.7))
            Line((6.3330836, -12.7), (9.5504, -12.7))
            ThreePointArc((9.5504, -12.7), (10.058323491, -12.192000006), (10.566399977, -12.699846982))
            ThreePointArc((10.566399977, -12.699846982), (12.082522516, -12.082522516), (12.699846982, -10.566399977))
            ThreePointArc((12.699846982, -10.566399977), (12.192000006, -10.058323491), (12.7, -9.5504))
        make_face()
        Circle(SKETCH1_R, mode=Mode.SUBTRACT)
    extrude(amount=BOSS_EXTRUDE1_DEPTH, both=True)


solid = part.part
